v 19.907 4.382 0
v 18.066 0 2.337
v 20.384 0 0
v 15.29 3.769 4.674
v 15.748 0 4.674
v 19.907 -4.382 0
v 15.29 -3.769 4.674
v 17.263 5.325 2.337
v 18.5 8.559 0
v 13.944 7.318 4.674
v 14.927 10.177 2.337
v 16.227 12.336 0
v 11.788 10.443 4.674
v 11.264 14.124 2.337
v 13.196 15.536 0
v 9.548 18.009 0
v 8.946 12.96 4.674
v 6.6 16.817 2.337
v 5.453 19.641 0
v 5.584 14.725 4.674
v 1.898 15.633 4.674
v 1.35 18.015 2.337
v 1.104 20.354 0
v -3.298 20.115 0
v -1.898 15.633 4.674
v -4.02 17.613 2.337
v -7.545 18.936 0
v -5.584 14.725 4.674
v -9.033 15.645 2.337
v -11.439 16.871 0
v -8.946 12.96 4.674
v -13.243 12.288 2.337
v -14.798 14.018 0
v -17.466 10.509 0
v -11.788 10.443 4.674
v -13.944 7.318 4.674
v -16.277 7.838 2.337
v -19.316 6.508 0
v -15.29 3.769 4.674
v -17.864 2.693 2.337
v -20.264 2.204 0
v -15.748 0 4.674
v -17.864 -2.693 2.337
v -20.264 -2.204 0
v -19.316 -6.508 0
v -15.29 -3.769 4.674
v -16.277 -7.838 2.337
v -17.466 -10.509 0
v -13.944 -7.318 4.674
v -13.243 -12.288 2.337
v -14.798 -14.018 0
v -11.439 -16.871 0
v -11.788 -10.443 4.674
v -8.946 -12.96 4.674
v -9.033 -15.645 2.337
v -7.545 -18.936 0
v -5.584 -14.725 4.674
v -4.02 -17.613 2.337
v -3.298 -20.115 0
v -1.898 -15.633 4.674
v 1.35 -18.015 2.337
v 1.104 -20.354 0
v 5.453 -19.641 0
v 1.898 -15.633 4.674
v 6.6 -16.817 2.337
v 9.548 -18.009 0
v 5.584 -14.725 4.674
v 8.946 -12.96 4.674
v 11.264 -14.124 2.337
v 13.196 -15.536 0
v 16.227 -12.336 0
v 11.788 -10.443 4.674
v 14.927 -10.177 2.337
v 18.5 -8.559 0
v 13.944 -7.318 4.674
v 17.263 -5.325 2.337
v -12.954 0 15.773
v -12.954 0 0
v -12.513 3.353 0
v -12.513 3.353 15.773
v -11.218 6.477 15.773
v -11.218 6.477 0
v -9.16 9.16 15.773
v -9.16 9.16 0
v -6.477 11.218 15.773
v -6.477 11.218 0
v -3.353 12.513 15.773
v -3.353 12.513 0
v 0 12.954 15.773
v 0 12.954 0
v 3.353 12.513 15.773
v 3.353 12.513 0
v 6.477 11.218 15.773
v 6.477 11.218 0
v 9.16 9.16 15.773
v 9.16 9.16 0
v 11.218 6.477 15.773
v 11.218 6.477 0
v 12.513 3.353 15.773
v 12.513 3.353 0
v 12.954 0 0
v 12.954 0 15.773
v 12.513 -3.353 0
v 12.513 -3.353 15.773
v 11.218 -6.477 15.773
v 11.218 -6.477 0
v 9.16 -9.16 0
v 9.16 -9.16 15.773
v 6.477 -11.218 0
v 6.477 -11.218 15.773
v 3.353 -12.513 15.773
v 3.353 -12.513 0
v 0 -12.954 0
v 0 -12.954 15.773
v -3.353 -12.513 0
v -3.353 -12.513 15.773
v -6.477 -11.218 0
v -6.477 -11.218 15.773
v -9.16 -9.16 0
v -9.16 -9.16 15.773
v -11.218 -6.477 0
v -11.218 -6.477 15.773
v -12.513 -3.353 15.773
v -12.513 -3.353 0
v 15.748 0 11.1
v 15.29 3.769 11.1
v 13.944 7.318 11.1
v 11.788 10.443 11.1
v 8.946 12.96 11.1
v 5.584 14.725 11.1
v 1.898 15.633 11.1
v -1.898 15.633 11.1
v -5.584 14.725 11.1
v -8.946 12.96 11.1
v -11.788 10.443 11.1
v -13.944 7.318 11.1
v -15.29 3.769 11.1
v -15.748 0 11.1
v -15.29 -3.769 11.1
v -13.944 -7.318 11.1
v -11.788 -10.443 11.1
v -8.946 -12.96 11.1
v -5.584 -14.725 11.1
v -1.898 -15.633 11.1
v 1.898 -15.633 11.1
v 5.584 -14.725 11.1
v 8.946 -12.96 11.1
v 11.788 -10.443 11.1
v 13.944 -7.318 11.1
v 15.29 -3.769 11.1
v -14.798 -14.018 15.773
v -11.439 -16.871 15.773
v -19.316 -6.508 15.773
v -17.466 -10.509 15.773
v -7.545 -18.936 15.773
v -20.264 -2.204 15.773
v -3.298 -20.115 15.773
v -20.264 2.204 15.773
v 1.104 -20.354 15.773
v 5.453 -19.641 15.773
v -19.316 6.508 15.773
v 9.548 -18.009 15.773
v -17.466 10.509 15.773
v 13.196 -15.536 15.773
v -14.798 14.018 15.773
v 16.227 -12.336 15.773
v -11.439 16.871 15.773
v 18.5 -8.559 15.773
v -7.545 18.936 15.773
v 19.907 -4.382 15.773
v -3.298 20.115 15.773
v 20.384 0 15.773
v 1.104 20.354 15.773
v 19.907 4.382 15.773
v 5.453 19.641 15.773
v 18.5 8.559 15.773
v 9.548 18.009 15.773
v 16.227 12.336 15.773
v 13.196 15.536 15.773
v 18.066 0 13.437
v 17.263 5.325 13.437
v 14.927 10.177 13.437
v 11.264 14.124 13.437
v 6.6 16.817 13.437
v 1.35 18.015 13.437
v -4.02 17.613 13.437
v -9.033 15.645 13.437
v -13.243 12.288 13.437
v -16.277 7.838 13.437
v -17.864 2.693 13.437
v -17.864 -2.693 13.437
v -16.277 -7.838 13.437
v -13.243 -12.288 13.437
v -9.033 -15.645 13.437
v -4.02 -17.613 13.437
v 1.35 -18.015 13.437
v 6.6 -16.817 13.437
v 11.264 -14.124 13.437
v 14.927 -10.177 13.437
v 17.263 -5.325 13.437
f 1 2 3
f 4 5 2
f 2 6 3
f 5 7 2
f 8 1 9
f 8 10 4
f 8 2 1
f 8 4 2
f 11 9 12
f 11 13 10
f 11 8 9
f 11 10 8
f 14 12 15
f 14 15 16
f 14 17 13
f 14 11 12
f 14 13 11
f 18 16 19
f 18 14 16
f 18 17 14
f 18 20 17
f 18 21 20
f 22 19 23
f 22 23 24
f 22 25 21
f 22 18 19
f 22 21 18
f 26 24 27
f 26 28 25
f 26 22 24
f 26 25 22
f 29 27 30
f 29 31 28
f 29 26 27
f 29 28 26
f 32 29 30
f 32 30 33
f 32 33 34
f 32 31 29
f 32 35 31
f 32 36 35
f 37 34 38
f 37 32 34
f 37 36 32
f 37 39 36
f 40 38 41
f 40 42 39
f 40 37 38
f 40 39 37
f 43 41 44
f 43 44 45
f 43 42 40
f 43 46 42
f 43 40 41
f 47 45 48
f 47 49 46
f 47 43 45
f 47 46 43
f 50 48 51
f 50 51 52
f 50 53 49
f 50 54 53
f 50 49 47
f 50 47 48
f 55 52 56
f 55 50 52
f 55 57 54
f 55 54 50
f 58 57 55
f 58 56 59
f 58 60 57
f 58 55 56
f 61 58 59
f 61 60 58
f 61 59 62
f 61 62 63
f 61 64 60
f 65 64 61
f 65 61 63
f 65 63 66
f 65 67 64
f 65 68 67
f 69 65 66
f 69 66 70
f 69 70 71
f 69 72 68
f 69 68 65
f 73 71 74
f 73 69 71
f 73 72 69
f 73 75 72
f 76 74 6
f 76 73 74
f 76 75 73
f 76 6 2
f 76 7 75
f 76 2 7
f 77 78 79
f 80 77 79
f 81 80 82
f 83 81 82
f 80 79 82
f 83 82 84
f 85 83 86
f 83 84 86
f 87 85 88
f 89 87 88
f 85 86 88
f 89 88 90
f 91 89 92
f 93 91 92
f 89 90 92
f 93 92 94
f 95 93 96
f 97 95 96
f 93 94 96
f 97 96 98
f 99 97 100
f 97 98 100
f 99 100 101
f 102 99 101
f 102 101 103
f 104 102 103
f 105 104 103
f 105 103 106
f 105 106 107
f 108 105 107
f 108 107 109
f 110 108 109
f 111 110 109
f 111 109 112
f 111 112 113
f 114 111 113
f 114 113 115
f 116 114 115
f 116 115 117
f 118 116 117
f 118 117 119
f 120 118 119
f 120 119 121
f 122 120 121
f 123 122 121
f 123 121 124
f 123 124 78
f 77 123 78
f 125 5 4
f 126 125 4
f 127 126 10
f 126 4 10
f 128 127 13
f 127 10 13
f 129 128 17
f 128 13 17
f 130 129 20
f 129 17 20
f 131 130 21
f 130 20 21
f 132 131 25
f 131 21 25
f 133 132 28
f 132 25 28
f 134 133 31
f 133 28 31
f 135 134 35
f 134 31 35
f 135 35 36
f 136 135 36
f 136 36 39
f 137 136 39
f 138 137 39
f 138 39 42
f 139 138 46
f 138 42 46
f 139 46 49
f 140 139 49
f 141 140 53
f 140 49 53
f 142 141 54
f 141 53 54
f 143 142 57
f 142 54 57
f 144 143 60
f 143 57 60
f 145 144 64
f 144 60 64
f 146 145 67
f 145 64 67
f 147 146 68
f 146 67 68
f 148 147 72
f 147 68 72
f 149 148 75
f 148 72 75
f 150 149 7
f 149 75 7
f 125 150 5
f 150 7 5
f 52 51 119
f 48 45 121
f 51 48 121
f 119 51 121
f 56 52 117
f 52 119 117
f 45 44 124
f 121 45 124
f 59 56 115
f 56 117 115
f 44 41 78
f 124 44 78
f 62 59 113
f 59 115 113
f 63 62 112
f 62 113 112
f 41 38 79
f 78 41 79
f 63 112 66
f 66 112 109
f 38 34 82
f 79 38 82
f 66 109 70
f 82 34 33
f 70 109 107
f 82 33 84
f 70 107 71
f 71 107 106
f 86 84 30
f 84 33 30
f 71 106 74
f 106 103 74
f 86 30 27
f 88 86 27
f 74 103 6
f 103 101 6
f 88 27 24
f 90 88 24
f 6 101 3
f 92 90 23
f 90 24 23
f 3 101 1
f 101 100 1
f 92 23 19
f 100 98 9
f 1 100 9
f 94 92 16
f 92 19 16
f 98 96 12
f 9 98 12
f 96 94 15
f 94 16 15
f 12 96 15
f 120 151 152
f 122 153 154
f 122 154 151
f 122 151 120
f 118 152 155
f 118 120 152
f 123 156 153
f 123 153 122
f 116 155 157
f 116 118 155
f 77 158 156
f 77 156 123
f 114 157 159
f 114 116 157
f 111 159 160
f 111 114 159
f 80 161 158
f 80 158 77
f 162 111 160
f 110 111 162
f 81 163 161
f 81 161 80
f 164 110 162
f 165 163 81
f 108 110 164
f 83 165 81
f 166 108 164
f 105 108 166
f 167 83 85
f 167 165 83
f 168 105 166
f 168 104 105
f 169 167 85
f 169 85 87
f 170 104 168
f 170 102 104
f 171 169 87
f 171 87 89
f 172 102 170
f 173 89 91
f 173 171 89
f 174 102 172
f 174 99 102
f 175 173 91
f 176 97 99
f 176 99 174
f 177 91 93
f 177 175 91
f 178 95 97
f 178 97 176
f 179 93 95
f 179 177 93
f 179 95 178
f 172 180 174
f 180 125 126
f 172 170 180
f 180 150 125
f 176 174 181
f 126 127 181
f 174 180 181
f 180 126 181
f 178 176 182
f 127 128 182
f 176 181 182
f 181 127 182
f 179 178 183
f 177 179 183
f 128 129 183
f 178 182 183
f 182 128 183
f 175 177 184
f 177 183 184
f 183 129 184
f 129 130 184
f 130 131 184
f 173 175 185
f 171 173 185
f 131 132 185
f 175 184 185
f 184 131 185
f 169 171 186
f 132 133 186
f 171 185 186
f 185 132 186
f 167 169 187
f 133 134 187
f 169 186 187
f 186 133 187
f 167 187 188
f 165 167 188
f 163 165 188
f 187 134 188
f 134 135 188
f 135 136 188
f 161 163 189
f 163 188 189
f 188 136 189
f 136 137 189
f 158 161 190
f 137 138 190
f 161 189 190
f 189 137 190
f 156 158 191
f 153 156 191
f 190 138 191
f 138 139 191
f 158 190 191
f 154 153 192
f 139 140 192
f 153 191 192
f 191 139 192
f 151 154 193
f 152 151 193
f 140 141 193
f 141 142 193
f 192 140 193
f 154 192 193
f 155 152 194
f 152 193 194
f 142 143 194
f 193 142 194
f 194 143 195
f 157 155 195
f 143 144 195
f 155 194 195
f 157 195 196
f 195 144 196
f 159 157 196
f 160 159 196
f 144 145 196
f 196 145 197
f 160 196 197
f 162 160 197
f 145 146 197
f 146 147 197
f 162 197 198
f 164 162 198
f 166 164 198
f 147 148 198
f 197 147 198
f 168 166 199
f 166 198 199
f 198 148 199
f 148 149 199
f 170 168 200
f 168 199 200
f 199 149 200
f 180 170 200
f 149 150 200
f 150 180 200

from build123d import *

# Parameters (mm, degrees)
F0_R      = 20.3835
F2_R      = 15.748
F4_DEPTH  = 6.4262
F6_R      = 20.3835
F4_FACE_R = 15.748
F9_D      = 25.908


with BuildPart() as f3:
    # F0 (on Top) → F3 section 0
    with BuildSketch(Plane.XY):
        Circle(F0_R)
    # F2 (on offset) → F3 section 1
    with BuildSketch(Plane.XY.offset(4.6736)):
        Circle(F2_R)
    loft()

    # F4 (add): a face of the model
    f4_faces = [f3.faces().sort_by_distance(p)[0] for p in [
        (0, 0, 4.6736),
    ]]
    extrude(f4_faces, amount=F4_DEPTH)

    # F6 (on offset) → F7 section 0
    with BuildSketch(Plane.XY.offset(15.7734)):
        Circle(F6_R)
    # F4_face (on face) → F7 section 1
    with BuildSketch(Plane.XY.offset(11.0998)):
        Circle(F4_FACE_R)
    loft()

    # F9 (through all)
    with Locations(Plane.XY.offset(15.7734)):
        with Locations((0, 0)):
            Hole(F9_D / 2)


solid = f3.part
